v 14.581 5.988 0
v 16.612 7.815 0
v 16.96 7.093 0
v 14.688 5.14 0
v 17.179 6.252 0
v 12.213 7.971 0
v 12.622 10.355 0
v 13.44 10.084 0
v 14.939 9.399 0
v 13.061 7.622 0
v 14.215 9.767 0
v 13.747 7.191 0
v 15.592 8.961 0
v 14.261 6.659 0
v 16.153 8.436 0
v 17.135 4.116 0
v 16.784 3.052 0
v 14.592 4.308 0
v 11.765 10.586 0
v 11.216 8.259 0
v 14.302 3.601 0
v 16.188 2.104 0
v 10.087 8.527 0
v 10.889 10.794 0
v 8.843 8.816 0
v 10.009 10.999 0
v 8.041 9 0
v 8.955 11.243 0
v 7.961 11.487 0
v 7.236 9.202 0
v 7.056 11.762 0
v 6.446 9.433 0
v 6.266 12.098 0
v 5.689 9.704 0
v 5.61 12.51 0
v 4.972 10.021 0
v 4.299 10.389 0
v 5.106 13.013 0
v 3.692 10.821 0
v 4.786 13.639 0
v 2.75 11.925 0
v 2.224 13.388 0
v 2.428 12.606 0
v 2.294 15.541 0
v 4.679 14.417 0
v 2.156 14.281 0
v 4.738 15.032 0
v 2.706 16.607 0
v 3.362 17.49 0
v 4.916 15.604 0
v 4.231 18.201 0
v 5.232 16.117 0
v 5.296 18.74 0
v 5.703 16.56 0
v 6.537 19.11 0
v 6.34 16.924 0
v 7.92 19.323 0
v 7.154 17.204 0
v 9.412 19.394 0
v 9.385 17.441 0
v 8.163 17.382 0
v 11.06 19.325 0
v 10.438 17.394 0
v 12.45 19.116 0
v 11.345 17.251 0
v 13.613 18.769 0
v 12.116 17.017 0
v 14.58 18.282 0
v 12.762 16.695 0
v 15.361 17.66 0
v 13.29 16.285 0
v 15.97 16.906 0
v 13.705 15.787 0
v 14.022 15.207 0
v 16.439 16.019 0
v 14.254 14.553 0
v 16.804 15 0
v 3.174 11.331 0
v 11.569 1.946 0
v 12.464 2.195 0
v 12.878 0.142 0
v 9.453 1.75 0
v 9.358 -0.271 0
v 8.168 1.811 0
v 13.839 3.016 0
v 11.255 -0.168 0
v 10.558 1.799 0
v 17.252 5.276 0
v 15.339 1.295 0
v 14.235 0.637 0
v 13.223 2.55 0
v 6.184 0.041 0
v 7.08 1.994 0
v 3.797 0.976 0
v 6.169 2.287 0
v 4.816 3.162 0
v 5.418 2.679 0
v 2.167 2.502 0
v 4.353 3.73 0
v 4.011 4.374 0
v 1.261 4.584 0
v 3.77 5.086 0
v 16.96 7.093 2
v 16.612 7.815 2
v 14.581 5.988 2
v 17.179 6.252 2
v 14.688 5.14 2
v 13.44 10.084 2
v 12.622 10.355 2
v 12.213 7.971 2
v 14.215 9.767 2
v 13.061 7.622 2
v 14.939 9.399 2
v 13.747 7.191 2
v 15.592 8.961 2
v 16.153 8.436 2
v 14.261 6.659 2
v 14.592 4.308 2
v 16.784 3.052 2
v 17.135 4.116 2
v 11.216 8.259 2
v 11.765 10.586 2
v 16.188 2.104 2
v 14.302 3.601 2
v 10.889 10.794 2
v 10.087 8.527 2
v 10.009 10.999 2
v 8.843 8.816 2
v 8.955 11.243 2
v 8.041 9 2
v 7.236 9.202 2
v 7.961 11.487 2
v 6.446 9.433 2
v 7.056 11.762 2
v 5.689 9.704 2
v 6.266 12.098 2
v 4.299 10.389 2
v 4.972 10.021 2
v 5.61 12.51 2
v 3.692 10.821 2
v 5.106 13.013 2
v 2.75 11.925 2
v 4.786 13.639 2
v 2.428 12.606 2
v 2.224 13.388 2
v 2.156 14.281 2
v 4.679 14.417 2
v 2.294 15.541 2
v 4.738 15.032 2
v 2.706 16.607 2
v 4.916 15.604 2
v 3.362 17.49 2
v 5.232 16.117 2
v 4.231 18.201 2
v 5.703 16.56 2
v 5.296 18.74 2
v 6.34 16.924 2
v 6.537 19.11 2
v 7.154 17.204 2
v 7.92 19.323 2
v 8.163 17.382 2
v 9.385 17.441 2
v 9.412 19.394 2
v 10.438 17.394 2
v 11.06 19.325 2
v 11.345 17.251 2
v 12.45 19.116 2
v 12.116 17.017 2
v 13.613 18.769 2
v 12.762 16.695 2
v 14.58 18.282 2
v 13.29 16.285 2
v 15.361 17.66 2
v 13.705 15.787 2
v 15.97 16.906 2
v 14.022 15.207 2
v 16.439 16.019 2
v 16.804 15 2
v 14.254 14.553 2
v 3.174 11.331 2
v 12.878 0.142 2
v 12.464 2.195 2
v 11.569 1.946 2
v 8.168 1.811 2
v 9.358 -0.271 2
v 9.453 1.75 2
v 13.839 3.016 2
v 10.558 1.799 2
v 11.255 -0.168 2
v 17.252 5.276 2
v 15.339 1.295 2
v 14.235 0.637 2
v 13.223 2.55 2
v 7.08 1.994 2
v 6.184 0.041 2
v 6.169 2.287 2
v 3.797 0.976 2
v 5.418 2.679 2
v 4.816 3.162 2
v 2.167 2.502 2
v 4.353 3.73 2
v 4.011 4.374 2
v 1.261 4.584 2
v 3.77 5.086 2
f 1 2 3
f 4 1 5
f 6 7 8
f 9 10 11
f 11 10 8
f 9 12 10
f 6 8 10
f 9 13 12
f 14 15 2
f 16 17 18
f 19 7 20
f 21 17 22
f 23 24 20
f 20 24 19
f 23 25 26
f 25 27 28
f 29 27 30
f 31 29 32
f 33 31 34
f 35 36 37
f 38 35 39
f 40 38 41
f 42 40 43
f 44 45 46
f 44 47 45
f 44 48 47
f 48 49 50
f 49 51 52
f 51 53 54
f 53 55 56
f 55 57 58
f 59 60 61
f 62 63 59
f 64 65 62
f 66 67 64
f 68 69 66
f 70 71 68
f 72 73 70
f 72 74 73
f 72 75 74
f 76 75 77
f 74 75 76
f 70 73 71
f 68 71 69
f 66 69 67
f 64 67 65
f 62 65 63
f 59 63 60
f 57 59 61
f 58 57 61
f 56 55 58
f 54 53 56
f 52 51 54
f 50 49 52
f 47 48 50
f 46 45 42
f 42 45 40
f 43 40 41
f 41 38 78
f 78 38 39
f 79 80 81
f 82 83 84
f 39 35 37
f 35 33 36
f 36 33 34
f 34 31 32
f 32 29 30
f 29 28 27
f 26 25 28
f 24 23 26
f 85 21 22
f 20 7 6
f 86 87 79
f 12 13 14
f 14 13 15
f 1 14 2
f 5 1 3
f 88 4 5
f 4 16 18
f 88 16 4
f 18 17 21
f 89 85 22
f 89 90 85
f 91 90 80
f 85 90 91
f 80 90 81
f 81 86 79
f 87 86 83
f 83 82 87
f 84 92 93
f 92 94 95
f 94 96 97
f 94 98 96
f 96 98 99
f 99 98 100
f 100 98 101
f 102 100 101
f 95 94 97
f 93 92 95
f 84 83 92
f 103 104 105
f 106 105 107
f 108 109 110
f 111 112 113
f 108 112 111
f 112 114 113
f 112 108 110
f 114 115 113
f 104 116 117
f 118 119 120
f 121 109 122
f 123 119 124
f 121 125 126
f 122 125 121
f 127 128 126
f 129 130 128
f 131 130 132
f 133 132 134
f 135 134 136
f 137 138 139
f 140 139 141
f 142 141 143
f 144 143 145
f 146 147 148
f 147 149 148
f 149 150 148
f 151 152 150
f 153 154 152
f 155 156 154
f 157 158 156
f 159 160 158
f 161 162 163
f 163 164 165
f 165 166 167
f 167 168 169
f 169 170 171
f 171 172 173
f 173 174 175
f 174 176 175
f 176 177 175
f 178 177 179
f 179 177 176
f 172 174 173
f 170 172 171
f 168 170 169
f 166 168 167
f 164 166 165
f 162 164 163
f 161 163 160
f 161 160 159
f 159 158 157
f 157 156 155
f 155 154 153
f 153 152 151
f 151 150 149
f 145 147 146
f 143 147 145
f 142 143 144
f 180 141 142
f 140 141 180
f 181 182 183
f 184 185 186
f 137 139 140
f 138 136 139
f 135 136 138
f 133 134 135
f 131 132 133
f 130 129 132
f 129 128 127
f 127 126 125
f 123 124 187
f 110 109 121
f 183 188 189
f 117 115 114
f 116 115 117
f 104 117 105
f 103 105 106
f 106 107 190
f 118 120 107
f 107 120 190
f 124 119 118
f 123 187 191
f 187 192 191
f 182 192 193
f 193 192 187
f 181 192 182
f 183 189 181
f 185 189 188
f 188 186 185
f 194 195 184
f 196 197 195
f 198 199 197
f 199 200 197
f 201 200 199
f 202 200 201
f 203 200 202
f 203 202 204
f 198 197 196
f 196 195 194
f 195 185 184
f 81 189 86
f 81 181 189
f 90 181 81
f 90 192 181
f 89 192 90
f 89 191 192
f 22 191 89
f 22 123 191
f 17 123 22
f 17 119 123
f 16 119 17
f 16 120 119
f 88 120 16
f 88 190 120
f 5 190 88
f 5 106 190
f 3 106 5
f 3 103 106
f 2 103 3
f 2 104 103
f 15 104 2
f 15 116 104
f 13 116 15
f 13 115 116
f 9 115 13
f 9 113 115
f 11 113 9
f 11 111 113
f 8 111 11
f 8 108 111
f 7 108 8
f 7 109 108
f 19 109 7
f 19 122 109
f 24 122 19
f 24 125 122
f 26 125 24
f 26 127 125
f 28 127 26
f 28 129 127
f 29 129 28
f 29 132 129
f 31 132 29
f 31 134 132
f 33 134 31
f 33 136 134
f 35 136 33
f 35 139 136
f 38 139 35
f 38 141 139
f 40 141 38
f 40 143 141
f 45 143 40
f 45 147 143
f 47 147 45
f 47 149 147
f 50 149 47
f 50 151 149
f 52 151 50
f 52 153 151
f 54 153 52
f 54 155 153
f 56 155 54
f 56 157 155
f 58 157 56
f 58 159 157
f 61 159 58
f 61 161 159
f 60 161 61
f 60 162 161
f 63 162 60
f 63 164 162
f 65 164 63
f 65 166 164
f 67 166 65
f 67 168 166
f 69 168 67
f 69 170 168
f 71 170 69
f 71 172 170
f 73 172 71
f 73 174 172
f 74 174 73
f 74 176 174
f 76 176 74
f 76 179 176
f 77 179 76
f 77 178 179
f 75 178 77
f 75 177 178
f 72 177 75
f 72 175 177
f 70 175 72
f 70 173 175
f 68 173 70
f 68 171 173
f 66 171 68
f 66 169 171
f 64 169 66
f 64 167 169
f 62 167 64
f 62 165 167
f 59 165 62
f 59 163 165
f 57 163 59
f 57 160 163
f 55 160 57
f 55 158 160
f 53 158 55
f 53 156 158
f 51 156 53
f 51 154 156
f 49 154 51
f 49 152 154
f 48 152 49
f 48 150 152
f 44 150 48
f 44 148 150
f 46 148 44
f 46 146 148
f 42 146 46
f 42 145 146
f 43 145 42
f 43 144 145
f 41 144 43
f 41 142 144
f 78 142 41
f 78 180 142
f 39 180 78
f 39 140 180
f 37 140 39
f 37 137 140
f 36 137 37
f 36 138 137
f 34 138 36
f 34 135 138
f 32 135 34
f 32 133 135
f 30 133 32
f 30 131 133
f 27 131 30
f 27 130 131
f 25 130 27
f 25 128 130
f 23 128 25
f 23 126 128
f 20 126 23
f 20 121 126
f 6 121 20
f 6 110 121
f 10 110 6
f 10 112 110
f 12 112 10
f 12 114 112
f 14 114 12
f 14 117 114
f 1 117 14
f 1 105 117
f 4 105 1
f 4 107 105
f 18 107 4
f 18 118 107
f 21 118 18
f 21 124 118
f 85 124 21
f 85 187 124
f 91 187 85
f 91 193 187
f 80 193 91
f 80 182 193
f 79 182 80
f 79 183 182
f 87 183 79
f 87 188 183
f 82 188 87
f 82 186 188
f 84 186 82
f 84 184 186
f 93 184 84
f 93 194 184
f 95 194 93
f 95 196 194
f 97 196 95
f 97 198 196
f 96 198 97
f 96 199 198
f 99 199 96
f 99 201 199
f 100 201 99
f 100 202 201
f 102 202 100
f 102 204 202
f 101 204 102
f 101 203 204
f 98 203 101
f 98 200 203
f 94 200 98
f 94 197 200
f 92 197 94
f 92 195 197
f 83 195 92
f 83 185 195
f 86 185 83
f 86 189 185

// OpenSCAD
// An extruded glyph, whose walls are the font's own Bezier curves.
//
// This is the arc channel's other half, and the case that showed one channel was
// not enough: a glyph outline is not made of arcs. FreeType hands text() its
// contours as lines and quadratic or cubic Beziers - FreetypeRenderer's conic_to
// and cubic_to - and DrawingCallback samples them into points one line after
// holding the control points, which is exactly what circle() used to do with its
// radius. Bezier2d records them where they are known.
//
// Extruded, such a segment sweeps a patch of degree (n, 1) whose control net is
// the segment's own control points at each end of the sweep. That is exact, not
// fitted, because a Bezier and a linear sweep are both affine in their control
// points - and it needed no recogniser work at all, because BezierPatchSurface
// takes a general degree and recogniseBezierPatches accepts any declared patch.
// The machinery came in for fillet(); a glyph wall is the same shape of thing.
//
// S rather than a rounder letter on purpose: it is all curve and no counter, so
// every one of its 32 patches is written and the count is the whole answer.
// step-extrude-text-counter.scad is the letter with a hole in it, which is the
// case that found a real gap in the recogniser.
//
// The font is named explicitly so the outline is the same wherever this runs;
// the test suite ships Liberation in tests/data/ttf.
//
// EXPECT: 32 analytic surfaces available (0 cylindrical, 0 spherical, 0 toroidal, 32 Bezier)
// EXPECT: 32 Bezier patches cover 64 facets
// EXPECT: 0 unresolved
// EXPECT: written as 36 faces instead of 68
$fn = 8;
linear_extrude(height = 2) text("S", size = 20, font = "Liberation Sans");
